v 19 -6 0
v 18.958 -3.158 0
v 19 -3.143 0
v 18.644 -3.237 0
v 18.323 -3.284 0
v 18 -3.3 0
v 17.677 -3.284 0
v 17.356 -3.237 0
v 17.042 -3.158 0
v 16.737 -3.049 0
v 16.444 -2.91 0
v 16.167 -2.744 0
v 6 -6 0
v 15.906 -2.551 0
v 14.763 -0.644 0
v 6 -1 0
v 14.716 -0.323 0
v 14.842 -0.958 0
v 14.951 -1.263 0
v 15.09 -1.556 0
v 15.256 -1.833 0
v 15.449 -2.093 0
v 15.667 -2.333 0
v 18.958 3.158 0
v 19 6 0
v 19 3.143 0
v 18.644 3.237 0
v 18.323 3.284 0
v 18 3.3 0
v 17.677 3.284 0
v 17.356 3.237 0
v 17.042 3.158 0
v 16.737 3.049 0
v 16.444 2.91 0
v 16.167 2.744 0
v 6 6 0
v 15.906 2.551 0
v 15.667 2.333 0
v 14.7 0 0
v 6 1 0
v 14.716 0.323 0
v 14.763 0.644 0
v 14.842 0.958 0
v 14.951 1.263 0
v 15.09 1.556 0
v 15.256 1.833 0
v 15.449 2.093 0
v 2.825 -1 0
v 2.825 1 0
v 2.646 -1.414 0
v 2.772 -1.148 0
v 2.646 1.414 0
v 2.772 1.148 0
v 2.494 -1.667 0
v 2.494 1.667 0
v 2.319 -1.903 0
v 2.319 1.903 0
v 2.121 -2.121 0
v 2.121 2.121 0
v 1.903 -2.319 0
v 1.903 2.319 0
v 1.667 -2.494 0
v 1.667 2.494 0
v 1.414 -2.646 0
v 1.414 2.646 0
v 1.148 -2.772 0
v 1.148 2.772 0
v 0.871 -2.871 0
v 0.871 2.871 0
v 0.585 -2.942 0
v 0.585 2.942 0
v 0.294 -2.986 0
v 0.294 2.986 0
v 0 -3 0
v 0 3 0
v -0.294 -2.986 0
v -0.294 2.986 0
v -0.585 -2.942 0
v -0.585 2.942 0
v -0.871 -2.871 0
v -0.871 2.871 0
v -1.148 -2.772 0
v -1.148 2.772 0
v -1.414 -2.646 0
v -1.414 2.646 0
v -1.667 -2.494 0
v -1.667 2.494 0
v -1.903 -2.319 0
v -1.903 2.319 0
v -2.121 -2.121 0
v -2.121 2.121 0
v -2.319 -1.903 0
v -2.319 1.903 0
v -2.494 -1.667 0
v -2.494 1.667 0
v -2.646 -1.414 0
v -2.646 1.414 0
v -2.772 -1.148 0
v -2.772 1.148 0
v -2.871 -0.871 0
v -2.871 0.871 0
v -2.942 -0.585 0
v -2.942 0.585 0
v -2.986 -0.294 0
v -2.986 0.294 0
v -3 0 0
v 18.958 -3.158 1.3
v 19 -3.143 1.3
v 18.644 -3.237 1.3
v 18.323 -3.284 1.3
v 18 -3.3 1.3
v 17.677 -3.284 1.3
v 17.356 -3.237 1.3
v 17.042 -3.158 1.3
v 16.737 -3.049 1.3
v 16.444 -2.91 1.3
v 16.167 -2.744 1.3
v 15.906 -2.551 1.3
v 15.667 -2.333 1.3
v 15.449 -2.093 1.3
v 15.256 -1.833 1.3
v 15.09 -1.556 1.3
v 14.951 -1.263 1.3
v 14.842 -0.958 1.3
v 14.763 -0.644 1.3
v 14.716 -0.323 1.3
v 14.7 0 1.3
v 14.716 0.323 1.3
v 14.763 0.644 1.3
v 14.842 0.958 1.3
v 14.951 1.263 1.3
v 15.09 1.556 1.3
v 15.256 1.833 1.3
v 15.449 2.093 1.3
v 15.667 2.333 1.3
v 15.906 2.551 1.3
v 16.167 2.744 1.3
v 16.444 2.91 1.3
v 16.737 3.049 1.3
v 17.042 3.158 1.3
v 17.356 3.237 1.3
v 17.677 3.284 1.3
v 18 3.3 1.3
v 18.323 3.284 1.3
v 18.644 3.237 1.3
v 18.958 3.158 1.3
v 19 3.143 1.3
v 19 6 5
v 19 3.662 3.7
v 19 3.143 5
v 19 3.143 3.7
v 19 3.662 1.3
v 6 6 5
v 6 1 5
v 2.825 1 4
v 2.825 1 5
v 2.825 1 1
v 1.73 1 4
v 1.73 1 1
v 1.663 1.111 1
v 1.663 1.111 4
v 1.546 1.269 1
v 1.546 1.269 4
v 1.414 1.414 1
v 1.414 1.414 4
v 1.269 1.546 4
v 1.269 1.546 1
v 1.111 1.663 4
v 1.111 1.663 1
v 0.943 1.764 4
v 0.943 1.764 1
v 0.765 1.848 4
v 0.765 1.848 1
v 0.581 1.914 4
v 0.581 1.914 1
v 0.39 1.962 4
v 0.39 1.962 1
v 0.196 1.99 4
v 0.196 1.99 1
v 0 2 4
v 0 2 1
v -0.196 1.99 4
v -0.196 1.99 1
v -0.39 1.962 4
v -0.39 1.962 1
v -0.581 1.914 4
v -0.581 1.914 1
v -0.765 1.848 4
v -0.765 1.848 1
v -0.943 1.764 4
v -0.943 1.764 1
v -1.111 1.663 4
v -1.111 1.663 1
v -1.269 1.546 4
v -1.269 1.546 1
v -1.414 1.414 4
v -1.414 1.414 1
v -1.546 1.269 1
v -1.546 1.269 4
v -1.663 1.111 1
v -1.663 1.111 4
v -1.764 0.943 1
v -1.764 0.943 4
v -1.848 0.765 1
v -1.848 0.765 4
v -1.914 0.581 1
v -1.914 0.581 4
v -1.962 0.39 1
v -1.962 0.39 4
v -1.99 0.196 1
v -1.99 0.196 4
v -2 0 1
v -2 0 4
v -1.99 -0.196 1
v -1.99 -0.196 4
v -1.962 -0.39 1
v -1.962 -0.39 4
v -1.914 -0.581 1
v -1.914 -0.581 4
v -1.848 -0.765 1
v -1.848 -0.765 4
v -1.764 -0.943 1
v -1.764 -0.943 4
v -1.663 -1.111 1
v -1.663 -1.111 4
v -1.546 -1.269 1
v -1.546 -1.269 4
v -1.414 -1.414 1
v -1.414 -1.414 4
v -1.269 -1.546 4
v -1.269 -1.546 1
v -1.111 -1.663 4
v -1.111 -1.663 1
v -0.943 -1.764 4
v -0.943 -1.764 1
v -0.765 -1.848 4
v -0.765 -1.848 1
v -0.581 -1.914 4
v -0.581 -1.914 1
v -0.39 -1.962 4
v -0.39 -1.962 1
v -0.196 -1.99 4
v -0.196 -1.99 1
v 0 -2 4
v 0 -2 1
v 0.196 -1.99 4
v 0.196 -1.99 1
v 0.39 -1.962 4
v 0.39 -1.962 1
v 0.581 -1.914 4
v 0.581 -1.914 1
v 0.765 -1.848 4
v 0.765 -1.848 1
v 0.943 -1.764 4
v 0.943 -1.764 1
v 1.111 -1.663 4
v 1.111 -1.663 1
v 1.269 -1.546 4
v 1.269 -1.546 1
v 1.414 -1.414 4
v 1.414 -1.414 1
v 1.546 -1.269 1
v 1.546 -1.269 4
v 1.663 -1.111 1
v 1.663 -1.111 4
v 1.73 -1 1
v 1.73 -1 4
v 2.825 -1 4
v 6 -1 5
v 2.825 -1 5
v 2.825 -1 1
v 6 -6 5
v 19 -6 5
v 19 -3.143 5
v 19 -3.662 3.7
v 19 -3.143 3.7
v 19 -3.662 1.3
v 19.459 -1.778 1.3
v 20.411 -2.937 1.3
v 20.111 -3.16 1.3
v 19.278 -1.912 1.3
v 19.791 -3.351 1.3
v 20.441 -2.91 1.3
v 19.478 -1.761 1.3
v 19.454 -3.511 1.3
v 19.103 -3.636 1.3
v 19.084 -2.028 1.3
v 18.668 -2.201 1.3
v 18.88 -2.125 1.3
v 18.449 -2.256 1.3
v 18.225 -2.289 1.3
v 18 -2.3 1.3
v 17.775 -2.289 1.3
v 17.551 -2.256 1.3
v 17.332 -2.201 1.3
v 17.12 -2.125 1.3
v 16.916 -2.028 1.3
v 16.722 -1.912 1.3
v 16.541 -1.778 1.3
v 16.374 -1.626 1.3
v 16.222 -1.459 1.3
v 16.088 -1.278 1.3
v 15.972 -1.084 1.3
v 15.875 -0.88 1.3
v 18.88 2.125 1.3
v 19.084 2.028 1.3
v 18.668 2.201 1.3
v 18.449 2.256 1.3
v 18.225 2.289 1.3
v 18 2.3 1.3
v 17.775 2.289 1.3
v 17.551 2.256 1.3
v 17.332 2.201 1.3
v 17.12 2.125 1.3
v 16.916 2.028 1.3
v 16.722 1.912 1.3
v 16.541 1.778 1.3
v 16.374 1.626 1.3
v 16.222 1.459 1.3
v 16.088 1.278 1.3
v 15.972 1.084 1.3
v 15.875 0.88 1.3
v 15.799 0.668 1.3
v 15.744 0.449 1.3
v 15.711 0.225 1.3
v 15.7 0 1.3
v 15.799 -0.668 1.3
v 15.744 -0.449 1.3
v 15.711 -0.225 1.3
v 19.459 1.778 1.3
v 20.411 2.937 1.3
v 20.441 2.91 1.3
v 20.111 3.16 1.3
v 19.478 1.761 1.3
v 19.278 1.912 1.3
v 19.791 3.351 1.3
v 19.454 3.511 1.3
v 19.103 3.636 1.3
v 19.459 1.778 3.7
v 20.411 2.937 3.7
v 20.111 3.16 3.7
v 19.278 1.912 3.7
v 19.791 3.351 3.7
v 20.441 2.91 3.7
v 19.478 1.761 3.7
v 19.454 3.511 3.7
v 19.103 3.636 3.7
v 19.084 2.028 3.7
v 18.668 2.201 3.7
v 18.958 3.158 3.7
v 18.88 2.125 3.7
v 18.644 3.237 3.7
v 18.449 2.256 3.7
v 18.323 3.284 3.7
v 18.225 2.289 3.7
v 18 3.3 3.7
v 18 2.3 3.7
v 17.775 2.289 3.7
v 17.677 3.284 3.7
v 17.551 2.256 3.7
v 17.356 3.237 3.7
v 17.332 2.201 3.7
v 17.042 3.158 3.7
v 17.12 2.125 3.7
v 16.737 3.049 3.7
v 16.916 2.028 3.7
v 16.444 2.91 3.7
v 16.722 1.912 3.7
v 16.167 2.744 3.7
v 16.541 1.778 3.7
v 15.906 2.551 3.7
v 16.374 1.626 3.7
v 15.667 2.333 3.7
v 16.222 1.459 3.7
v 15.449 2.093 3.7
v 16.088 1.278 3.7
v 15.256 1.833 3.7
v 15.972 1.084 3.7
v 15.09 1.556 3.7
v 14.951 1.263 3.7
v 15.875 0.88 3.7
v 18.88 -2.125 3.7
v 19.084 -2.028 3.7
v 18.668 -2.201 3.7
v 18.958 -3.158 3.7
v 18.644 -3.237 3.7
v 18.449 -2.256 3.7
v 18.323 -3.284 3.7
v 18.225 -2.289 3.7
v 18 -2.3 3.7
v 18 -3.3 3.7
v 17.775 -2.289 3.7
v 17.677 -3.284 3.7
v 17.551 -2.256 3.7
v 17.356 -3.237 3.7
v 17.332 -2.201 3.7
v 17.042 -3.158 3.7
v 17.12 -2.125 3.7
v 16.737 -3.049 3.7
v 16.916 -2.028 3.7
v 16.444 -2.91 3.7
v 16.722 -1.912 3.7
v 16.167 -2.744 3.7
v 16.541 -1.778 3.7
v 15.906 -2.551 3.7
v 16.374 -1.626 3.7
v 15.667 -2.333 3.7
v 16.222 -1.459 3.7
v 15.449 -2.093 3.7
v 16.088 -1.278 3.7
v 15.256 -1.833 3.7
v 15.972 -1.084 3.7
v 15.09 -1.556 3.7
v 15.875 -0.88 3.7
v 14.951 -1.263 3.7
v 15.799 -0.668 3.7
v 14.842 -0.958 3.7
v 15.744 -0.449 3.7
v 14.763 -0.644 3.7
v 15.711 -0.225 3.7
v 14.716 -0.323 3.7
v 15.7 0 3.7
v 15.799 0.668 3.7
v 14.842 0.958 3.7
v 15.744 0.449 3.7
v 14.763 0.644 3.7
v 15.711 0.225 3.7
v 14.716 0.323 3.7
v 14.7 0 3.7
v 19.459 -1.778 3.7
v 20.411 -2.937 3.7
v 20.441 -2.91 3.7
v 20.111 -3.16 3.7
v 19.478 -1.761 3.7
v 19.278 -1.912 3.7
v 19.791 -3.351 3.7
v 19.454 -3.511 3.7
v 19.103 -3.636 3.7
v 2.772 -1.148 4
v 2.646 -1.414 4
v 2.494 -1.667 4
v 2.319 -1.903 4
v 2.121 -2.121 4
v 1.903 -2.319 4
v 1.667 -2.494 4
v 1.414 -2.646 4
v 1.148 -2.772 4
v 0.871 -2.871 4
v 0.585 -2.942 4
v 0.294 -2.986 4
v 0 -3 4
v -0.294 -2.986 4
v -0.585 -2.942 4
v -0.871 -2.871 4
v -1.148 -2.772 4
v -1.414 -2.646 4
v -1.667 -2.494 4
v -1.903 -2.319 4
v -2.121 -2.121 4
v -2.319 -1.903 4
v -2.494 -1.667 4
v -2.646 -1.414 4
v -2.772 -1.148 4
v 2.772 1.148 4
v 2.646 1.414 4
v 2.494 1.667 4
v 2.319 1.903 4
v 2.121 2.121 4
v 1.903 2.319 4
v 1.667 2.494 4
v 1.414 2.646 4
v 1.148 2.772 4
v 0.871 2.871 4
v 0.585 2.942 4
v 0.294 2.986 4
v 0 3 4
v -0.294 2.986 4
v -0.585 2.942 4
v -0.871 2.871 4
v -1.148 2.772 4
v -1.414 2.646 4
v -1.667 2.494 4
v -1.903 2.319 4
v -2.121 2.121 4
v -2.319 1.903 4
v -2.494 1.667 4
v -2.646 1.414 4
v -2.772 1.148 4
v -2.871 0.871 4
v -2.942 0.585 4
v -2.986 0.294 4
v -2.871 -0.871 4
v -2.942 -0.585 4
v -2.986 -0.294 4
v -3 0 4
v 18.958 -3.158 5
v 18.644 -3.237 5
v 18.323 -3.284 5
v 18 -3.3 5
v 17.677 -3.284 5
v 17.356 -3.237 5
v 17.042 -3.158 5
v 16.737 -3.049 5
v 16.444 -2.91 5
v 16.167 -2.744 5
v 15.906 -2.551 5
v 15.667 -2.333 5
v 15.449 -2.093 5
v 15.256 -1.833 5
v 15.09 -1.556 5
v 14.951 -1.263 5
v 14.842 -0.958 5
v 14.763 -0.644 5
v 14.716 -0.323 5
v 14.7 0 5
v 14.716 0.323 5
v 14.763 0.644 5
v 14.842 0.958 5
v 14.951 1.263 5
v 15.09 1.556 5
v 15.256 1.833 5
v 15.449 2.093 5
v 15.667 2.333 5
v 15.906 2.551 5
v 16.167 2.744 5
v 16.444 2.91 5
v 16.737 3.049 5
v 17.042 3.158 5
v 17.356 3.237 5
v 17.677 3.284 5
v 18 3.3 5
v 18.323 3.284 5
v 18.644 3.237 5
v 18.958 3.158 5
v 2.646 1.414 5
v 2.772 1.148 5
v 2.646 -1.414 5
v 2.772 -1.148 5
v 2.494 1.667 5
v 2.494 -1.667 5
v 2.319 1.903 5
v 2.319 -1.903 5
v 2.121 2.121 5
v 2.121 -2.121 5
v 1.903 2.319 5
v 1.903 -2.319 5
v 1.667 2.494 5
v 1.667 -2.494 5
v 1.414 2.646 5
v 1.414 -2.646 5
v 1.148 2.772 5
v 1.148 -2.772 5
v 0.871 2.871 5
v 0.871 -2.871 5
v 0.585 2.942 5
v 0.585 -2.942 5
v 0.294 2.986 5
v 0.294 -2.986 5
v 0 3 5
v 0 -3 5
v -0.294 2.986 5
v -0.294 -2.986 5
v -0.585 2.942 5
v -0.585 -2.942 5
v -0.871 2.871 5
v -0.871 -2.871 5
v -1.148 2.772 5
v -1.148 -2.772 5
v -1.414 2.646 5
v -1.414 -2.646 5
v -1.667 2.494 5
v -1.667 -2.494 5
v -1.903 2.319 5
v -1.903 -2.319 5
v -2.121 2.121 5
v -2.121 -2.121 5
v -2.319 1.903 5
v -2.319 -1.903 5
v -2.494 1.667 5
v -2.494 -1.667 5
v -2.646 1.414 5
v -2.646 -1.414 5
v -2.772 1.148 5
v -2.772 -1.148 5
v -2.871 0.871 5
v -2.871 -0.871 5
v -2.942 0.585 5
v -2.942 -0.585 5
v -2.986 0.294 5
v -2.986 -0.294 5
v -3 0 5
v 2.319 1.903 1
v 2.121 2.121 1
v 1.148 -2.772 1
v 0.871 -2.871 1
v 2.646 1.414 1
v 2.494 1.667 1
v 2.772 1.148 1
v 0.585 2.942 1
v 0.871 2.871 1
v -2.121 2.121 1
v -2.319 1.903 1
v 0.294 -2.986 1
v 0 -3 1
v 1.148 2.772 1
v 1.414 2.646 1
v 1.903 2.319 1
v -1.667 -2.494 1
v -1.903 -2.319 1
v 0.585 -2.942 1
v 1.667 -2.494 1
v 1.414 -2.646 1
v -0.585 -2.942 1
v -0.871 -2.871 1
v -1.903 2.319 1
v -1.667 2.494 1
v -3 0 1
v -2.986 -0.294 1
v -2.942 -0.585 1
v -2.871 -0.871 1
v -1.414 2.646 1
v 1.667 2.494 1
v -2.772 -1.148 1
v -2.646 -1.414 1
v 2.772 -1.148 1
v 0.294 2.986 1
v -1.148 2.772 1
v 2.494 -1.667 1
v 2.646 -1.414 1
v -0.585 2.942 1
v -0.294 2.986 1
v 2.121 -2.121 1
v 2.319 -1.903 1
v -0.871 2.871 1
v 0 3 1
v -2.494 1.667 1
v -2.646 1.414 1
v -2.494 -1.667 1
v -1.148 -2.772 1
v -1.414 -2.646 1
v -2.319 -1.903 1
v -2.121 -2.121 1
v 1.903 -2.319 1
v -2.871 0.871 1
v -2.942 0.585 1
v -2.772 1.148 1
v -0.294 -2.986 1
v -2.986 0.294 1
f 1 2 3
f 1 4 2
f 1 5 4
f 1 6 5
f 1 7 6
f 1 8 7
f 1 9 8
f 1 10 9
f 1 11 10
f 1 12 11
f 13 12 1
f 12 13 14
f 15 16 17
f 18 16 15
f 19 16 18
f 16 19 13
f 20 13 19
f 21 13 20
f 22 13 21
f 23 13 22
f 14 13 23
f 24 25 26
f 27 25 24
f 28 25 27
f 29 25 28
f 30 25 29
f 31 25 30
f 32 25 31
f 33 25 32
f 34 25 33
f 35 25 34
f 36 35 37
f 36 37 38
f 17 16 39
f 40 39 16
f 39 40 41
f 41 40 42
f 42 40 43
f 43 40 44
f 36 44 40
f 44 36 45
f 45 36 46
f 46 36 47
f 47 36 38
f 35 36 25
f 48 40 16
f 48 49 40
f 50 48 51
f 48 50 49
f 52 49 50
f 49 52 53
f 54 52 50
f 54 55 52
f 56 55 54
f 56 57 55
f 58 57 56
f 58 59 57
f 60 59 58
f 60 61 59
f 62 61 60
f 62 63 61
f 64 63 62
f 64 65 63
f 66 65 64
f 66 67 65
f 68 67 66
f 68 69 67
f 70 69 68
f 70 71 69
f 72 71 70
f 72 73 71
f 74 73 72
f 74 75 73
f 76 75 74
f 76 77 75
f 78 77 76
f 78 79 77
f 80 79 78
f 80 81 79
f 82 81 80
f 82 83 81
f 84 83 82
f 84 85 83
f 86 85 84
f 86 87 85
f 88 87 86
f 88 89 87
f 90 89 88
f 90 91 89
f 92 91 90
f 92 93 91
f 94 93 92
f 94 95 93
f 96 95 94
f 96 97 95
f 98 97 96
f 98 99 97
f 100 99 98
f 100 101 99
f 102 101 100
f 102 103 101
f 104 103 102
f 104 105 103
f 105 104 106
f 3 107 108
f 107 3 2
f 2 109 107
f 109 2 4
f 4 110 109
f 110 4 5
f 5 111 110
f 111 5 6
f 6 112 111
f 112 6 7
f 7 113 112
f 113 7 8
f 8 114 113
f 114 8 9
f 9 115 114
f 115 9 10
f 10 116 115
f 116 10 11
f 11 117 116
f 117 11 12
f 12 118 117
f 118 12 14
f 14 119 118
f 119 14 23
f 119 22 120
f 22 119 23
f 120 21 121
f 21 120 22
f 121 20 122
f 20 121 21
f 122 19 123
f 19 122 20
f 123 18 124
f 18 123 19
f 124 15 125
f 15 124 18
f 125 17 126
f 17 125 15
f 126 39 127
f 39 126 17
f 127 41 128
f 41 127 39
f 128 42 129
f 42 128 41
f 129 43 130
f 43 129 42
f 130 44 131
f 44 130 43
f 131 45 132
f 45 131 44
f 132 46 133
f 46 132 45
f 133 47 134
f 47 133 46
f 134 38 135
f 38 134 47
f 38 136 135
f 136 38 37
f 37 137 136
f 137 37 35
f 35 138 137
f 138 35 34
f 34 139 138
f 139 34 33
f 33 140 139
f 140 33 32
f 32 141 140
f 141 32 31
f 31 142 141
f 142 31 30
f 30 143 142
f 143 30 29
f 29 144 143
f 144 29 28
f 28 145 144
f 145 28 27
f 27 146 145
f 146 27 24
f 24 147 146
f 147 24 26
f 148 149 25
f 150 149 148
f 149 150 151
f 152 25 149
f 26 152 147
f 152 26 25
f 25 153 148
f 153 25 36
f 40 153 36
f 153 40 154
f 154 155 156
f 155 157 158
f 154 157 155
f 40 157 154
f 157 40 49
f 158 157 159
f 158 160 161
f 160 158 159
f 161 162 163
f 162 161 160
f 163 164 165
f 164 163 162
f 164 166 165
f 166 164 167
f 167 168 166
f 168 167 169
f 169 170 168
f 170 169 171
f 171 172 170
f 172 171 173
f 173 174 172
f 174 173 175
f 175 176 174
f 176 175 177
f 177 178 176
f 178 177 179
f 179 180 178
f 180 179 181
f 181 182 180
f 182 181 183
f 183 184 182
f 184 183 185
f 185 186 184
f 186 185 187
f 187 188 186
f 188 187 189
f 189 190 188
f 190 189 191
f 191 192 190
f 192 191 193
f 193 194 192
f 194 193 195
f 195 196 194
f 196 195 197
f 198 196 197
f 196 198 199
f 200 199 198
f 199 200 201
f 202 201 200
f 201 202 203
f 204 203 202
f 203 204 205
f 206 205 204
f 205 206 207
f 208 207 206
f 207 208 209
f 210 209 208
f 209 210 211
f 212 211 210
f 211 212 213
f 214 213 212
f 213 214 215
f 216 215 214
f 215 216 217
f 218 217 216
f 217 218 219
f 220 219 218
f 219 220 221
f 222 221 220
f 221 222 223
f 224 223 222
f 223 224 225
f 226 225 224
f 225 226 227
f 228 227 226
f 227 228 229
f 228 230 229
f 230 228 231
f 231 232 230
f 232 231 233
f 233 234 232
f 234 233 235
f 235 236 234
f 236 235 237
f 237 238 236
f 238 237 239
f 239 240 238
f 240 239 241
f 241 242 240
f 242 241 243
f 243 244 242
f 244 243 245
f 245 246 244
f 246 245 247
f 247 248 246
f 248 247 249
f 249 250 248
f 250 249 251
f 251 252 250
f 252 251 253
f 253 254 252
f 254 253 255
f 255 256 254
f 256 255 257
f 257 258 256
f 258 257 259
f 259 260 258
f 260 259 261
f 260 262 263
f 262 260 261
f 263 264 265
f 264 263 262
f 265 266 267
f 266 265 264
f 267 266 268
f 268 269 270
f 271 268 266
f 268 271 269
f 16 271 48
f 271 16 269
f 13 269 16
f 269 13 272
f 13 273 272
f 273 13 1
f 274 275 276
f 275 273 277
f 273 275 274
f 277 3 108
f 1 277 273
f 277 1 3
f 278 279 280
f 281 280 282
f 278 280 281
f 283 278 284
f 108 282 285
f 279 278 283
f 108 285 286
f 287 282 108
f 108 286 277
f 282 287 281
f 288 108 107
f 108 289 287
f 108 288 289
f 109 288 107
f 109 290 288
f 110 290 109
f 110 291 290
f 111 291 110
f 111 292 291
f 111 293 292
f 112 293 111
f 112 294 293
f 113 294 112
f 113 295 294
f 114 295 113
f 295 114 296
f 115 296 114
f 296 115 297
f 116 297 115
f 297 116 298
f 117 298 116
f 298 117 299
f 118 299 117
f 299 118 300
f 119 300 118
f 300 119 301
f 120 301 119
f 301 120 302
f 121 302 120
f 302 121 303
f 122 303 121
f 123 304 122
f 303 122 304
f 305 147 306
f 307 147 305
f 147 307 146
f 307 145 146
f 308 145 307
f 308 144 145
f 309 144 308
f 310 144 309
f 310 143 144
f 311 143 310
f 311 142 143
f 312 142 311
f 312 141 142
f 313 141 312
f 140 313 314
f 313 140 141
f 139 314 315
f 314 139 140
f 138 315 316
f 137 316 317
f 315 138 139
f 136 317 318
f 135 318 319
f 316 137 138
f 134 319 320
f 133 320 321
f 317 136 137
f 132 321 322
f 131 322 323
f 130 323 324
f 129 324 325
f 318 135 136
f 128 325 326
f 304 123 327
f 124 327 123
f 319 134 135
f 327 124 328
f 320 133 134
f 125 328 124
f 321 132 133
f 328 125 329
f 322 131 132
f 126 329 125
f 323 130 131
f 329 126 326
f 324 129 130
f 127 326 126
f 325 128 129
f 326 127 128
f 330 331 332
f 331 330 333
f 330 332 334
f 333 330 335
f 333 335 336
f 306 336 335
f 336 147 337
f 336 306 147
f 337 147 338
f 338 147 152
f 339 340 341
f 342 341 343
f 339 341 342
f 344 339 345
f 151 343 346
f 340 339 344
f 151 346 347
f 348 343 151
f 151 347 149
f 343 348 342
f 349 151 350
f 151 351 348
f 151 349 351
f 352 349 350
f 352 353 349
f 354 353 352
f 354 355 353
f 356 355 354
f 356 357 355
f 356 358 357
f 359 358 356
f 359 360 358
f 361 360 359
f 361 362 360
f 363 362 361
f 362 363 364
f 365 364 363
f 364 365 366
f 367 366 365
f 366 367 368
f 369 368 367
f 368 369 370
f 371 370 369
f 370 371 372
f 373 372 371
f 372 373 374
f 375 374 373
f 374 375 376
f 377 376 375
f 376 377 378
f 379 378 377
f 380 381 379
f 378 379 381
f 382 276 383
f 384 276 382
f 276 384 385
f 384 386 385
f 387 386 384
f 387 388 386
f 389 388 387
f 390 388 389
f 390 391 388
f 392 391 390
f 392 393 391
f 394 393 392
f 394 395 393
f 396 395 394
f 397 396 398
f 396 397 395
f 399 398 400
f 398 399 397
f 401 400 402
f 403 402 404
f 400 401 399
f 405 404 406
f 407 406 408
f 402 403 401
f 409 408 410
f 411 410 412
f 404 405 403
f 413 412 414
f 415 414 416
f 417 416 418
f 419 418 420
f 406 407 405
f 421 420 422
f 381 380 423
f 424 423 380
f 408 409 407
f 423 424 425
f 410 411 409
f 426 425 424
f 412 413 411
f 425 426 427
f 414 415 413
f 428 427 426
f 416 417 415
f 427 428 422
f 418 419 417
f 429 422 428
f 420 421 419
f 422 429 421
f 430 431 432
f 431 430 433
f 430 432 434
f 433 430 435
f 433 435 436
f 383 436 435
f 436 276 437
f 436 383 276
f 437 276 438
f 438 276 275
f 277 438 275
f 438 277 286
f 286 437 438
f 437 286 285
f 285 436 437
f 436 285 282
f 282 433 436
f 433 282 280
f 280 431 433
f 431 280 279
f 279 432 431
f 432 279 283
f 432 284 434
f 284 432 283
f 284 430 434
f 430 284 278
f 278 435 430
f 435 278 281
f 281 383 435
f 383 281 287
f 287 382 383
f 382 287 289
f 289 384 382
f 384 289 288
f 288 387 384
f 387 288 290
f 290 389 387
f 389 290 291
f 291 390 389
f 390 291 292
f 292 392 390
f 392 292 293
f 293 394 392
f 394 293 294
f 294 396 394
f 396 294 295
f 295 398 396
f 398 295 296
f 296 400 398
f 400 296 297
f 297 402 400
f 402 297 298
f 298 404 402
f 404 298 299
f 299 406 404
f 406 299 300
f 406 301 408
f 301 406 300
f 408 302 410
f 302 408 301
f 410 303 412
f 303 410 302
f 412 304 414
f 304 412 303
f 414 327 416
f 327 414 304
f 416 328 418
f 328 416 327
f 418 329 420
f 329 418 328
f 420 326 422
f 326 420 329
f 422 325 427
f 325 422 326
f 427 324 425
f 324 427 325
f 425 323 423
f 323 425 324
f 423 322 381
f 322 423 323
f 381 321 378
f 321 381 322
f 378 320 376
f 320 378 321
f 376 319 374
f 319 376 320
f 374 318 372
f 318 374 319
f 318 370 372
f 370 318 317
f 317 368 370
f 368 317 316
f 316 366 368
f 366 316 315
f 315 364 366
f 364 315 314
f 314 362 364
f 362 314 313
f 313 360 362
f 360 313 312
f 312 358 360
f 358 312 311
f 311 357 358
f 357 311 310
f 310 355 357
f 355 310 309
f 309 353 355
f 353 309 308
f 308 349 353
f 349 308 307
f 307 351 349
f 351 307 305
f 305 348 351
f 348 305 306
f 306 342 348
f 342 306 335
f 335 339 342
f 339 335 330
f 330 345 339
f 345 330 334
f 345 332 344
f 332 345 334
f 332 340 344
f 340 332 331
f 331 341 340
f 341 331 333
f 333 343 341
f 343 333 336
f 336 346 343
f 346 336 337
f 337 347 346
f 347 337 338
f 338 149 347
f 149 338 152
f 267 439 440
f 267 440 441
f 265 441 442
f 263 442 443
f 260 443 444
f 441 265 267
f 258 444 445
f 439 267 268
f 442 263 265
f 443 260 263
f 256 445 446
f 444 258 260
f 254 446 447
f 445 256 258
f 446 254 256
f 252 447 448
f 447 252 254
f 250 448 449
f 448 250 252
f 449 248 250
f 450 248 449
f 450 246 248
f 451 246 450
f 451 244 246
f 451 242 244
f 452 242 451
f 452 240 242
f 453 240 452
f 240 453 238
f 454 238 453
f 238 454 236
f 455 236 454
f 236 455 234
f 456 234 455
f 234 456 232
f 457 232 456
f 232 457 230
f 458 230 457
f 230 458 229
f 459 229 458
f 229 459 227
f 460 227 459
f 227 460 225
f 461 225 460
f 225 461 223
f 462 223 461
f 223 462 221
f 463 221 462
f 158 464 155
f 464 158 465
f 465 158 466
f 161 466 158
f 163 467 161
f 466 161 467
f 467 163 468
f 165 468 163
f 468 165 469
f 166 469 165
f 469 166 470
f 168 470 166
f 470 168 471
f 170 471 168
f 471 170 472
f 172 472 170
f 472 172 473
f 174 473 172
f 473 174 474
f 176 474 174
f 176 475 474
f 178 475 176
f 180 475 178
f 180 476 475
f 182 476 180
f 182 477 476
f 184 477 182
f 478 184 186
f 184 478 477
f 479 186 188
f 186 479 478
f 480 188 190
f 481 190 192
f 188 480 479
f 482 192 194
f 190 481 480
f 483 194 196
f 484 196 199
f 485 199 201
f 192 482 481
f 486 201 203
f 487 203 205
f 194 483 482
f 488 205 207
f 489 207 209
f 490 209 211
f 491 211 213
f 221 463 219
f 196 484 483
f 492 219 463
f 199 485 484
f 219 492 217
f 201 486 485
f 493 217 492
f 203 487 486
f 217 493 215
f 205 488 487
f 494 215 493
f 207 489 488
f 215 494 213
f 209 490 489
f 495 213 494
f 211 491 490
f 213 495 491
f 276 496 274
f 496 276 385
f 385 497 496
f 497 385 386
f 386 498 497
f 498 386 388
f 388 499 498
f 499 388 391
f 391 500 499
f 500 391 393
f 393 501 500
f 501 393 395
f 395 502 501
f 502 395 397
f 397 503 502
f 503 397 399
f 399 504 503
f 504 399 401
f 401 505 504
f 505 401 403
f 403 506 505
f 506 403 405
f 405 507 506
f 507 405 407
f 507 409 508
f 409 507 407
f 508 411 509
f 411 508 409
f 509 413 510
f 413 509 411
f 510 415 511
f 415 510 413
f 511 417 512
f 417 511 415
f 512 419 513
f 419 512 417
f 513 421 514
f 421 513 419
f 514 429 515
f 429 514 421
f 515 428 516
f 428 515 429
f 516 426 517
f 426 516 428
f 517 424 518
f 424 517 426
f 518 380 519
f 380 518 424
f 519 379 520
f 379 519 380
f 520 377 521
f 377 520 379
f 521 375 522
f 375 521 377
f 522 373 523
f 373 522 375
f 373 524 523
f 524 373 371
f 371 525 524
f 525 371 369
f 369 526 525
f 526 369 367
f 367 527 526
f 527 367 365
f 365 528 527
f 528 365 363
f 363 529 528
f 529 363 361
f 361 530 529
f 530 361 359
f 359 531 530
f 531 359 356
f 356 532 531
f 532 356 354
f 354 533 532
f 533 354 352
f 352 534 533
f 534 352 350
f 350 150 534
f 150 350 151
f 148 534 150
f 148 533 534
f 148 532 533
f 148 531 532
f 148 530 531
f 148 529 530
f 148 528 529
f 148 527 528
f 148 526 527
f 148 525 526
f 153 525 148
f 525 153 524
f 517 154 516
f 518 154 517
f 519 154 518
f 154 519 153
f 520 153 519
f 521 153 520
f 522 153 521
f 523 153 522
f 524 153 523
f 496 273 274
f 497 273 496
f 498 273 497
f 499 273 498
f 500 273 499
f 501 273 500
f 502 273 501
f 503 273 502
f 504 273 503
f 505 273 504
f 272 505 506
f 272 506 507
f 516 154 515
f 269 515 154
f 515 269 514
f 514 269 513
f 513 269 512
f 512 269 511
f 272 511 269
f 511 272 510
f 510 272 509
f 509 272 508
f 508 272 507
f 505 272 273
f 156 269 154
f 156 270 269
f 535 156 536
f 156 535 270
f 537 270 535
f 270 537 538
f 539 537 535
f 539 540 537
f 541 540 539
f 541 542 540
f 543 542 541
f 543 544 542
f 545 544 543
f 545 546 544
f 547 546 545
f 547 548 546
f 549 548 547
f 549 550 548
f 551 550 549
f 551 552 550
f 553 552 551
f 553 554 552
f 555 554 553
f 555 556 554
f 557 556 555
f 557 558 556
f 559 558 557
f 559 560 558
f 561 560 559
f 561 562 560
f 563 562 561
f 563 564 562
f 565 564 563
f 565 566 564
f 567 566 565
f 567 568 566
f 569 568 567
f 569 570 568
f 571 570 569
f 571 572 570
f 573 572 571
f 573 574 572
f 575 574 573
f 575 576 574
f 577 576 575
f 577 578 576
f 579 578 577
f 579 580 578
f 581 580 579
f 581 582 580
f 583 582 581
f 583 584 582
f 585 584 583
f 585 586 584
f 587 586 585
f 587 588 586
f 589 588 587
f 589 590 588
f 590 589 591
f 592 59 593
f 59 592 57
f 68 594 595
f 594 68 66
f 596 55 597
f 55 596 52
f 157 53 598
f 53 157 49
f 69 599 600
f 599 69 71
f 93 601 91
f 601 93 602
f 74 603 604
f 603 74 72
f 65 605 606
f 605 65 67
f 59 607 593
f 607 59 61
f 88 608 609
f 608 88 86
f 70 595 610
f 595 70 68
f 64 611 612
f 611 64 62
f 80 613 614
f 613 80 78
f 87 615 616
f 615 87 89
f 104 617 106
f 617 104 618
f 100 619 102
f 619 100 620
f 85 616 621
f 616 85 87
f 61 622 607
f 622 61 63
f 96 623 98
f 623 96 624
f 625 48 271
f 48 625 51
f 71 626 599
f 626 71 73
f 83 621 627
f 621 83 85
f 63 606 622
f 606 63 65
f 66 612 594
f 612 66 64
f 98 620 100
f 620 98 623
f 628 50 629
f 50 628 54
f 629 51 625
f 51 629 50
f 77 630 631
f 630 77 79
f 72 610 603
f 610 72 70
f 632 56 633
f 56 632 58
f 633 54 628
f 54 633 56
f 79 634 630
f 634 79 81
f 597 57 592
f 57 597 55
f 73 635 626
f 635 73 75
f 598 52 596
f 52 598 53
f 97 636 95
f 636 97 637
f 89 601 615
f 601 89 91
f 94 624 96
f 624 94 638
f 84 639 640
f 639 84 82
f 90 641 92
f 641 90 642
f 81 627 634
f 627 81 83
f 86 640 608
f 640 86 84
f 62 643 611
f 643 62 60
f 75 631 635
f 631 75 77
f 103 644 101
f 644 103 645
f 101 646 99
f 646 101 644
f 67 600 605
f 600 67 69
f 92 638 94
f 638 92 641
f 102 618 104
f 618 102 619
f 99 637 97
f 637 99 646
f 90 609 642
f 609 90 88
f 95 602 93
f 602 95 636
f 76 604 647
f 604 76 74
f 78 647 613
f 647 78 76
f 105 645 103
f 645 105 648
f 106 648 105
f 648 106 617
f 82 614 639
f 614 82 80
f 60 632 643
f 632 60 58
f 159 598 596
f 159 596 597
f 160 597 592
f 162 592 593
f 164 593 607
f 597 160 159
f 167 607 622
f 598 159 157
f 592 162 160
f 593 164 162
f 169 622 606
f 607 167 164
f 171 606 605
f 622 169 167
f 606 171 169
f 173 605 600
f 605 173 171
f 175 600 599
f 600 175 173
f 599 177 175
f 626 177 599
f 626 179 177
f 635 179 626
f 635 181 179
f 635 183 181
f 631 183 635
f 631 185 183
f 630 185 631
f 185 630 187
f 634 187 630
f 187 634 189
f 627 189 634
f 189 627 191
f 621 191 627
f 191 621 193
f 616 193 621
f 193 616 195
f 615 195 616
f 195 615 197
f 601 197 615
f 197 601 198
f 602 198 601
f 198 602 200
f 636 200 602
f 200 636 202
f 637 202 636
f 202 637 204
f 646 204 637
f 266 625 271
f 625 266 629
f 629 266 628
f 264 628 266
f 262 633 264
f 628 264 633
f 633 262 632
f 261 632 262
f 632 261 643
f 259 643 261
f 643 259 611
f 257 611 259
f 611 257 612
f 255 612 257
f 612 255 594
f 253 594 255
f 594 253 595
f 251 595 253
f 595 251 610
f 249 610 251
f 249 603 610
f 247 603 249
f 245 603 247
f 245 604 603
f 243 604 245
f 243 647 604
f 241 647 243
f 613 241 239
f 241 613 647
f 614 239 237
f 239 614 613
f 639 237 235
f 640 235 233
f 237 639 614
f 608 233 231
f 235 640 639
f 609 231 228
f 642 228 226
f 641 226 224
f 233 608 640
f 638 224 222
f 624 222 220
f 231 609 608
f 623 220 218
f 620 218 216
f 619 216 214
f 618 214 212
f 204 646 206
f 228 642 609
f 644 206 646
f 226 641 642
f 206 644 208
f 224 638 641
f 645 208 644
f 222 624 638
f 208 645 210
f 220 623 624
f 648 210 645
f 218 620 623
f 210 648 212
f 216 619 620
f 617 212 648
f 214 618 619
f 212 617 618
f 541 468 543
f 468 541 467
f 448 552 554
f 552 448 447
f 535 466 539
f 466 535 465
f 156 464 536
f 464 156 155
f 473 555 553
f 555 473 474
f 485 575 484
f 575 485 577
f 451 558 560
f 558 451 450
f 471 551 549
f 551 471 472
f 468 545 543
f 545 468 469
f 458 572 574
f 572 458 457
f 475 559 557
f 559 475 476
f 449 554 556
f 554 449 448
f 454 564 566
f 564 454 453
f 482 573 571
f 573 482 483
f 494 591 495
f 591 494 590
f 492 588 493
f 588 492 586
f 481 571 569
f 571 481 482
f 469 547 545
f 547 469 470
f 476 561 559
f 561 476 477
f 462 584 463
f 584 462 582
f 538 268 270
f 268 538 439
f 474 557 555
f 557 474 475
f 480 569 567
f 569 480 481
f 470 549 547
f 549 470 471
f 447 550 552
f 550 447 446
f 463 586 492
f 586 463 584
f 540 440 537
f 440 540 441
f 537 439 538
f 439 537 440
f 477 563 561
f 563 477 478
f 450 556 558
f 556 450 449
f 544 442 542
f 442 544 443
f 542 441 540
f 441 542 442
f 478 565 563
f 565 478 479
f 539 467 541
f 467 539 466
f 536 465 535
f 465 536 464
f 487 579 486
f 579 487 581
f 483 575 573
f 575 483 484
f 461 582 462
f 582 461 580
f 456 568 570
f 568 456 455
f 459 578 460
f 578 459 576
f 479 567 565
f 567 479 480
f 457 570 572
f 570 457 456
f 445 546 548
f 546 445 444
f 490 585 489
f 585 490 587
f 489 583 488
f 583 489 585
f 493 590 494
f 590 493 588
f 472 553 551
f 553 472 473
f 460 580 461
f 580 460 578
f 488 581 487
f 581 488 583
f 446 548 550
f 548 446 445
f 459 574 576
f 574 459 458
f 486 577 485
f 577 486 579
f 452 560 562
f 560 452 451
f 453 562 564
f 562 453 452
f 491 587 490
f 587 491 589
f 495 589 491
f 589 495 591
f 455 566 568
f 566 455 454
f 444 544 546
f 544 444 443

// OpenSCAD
part = "link"; // [link, assembly]
cadverify_only = "";
module instance(name, part, unit = 1) {
    echo(cadverify_instance = [name, part, unit]);
    if (cadverify_only == "" || cadverify_only == name) children();
}

// Parameters (mm)
pitch = 18;          // pin-to-bore distance (10 links = 180mm)
link_w = 12;         // width (Y)
link_t = 5;          // thickness (Z)
pin_d = 4;           // pin shaft diameter
bore_d = 4.6;        // bore diameter (0.3 radial clearance)
cap_d = 6;           // cap diameter
cap_h = 1;           // cap thickness
gap_z = 0.3;         // vertical clearance cap<->knuckle
kn_out_d = 7.6;      // knuckle outer diameter (1.5 wall)
cap_cav_d = 6.6;     // cap cavity diameter (0.3 radial clearance)
neck_w = 2;          // neck width
slot_half = 50;      // slot half-angle (deg), allows +-30 deg swing
yoke_west = 6;       // yoke west edge (local X)
yoke_east = 19;      // yoke east extent (local X, 1.0 past bore)
$fn = 64;

module link_geom() {
    bore_x = pitch;
    pin_r = pin_d/2;
    bore_r = bore_d/2;
    kn_out_r = kn_out_d/2;
    cav_r = cap_cav_d/2;
    cap_r = cap_d/2;
    wedge_far = 30;
    dy_far = wedge_far * tan(slot_half);
    bot_h = cap_h;            // 0..1
    gap_h = gap_z;            // 0.3
    kn_h = link_t - 2*cap_h - 2*gap_h; // 2.4 (1.3..3.7)
    // bottom (0..1): pin+neck+yoke minus cap cavity minus slot
    translate([0,0,0]) linear_extrude(height = bot_h, convexity = 8) {
        difference() {
            union() {
                circle(r = pin_r);
                translate([0,-neck_w/2]) square([yoke_west+1, neck_w]);
                translate([yoke_west,-link_w/2]) square([yoke_east-yoke_west, link_w]);
            }
            translate([bore_x,0]) circle(r = cav_r);
            polygon(points = [[bore_x,0],[bore_x+wedge_far, dy_far],[bore_x+wedge_far, -dy_far]]);
        }
    }
    // lower gap (1..1.3): same footprint
    translate([0,0,bot_h]) linear_extrude(height = gap_h, convexity = 8) {
        difference() {
            union() {
                circle(r = pin_r);
                translate([0,-neck_w/2]) square([yoke_west+1, neck_w]);
                translate([yoke_west,-link_w/2]) square([yoke_east-yoke_west, link_w]);
            }
            translate([bore_x,0]) circle(r = cav_r);
            polygon(points = [[bore_x,0],[bore_x+wedge_far, dy_far],[bore_x+wedge_far, -dy_far]]);
        }
    }
    // middle knuckle zone (1.3..3.7)
    translate([0,0,bot_h+gap_h]) linear_extrude(height = kn_h, convexity = 8) {
        difference() {
            union() {
                circle(r = pin_r);
                translate([0,-neck_w/2]) square([yoke_west+1, neck_w]);
                translate([yoke_west,-link_w/2]) square([yoke_east-yoke_west, link_w]);
                translate([bore_x,0]) circle(r = kn_out_r);
            }
            translate([bore_x,0]) circle(r = bore_r);
            polygon(points = [[bore_x,0],[bore_x+wedge_far, dy_far],[bore_x+wedge_far, -dy_far]]);
        }
    }
    // upper gap (3.7..4)
    translate([0,0,bot_h+gap_h+kn_h]) linear_extrude(height = gap_h, convexity = 8) {
        difference() {
            union() {
                circle(r = pin_r);
                translate([0,-neck_w/2]) square([yoke_west+1, neck_w]);
                translate([yoke_west,-link_w/2]) square([yoke_east-yoke_west, link_w]);
            }
            translate([bore_x,0]) circle(r = cav_r);
            polygon(points = [[bore_x,0],[bore_x+wedge_far, dy_far],[bore_x+wedge_far, -dy_far]]);
        }
    }
    // top (4..5)
    translate([0,0,bot_h+gap_h+kn_h+gap_h]) linear_extrude(height = bot_h, convexity = 8) {
        difference() {
            union() {
                circle(r = pin_r);
                translate([0,-neck_w/2]) square([yoke_west+1, neck_w]);
                translate([yoke_west,-link_w/2]) square([yoke_east-yoke_west, link_w]);
            }
            translate([bore_x,0]) circle(r = cav_r);
            polygon(points = [[bore_x,0],[bore_x+wedge_far, dy_far],[bore_x+wedge_far, -dy_far]]);
        }
    }
    // caps (pin ends)
    translate([0,0,0]) cylinder(h = cap_h, r = cap_r);
    translate([0,0,link_t-cap_h]) cylinder(h = cap_h, r = cap_r);
}

if (part == "assembly") {
    instance("link1", "link", 1) translate([0,0,0]) link_geom();
    instance("link2", "link", 1) translate([18,0,0]) link_geom();
    instance("link3", "link", 1) translate([36,0,0]) link_geom();
    echo(cadverify_spec = [
        ["bounds", [[-3, -6, 0], [57.8, 6, 5]]],
        ["support_faces", [["bed", "-z", 200]]],
        ["motions", [
            ["bend", ["link3"], "rotate", [36, 0, 0], [0, 0, 1], [-30, 30]]
        ]],
        ["assembly_order", [
            [["link1", "link2", "link3"], [0, 0, 0]]
        ]],
        ["print_in_place", 0.3],
        ["overhangs_allowed", [
            ["pin cap link1", [[-3, -3, 3.8], [3, 3, 4.2]]],
            ["knuckle joint1", [[14, -4, 1.0], [22, 4, 1.6]]],
            ["pin cap link2", [[15, -3, 3.8], [21, 3, 4.2]]],
            ["knuckle joint2", [[32, -4, 1.0], [40, 4, 1.6]]],
            ["pin cap link3", [[33, -3, 3.8], [39, 3, 4.2]]],
            ["knuckle end", [[50, -4, 1.0], [58, 4, 1.6]]]
        ]],
        ["held", ["link1", "link2", "link3"]]
    ]);
} else {
    link_geom();
    echo(cadverify_spec = [
        ["bounds", [[-3, -6, 0], [21.8, 6, 5]]],
        ["bodies", 1],
        ["through_holes", 0],
        ["support_faces", [["bed", "-z", 100]]],
        ["overhangs_allowed", [
            ["pin cap", [[-3, -3, 3.8], [3, 3, 4.2]]],
            ["knuckle ceiling", [[14, -4, 1.0], [22, 4, 1.6]]]
        ]],
        ["copies", 3],
        ["details", [
            ["body", "material", [[6, -6, 0], [14, 6, 5]], 0.85],
            ["neck", "material", [[0, -1, 0], [7, 1, 5]], 0.8],
            ["knuckle", "material", [[14.2, -3.8, 1.3], [21.8, 3.8, 3.7]], 0.25],
            ["slot", "void", [[19, -1, 0], [21, 1, 5]], 0.8],
            ["cap_cavity", "void", [[14.7, -3.3, 0], [21.3, 3.3, 1]], 0.5],
            ["wall", "thickness", [18, 7, 2.5], [0, -1, 0], 3.7],
            ["floor", "thickness", [9, 0, -1], [0, 0, 1], 5]
        ]]
    ]);
}
